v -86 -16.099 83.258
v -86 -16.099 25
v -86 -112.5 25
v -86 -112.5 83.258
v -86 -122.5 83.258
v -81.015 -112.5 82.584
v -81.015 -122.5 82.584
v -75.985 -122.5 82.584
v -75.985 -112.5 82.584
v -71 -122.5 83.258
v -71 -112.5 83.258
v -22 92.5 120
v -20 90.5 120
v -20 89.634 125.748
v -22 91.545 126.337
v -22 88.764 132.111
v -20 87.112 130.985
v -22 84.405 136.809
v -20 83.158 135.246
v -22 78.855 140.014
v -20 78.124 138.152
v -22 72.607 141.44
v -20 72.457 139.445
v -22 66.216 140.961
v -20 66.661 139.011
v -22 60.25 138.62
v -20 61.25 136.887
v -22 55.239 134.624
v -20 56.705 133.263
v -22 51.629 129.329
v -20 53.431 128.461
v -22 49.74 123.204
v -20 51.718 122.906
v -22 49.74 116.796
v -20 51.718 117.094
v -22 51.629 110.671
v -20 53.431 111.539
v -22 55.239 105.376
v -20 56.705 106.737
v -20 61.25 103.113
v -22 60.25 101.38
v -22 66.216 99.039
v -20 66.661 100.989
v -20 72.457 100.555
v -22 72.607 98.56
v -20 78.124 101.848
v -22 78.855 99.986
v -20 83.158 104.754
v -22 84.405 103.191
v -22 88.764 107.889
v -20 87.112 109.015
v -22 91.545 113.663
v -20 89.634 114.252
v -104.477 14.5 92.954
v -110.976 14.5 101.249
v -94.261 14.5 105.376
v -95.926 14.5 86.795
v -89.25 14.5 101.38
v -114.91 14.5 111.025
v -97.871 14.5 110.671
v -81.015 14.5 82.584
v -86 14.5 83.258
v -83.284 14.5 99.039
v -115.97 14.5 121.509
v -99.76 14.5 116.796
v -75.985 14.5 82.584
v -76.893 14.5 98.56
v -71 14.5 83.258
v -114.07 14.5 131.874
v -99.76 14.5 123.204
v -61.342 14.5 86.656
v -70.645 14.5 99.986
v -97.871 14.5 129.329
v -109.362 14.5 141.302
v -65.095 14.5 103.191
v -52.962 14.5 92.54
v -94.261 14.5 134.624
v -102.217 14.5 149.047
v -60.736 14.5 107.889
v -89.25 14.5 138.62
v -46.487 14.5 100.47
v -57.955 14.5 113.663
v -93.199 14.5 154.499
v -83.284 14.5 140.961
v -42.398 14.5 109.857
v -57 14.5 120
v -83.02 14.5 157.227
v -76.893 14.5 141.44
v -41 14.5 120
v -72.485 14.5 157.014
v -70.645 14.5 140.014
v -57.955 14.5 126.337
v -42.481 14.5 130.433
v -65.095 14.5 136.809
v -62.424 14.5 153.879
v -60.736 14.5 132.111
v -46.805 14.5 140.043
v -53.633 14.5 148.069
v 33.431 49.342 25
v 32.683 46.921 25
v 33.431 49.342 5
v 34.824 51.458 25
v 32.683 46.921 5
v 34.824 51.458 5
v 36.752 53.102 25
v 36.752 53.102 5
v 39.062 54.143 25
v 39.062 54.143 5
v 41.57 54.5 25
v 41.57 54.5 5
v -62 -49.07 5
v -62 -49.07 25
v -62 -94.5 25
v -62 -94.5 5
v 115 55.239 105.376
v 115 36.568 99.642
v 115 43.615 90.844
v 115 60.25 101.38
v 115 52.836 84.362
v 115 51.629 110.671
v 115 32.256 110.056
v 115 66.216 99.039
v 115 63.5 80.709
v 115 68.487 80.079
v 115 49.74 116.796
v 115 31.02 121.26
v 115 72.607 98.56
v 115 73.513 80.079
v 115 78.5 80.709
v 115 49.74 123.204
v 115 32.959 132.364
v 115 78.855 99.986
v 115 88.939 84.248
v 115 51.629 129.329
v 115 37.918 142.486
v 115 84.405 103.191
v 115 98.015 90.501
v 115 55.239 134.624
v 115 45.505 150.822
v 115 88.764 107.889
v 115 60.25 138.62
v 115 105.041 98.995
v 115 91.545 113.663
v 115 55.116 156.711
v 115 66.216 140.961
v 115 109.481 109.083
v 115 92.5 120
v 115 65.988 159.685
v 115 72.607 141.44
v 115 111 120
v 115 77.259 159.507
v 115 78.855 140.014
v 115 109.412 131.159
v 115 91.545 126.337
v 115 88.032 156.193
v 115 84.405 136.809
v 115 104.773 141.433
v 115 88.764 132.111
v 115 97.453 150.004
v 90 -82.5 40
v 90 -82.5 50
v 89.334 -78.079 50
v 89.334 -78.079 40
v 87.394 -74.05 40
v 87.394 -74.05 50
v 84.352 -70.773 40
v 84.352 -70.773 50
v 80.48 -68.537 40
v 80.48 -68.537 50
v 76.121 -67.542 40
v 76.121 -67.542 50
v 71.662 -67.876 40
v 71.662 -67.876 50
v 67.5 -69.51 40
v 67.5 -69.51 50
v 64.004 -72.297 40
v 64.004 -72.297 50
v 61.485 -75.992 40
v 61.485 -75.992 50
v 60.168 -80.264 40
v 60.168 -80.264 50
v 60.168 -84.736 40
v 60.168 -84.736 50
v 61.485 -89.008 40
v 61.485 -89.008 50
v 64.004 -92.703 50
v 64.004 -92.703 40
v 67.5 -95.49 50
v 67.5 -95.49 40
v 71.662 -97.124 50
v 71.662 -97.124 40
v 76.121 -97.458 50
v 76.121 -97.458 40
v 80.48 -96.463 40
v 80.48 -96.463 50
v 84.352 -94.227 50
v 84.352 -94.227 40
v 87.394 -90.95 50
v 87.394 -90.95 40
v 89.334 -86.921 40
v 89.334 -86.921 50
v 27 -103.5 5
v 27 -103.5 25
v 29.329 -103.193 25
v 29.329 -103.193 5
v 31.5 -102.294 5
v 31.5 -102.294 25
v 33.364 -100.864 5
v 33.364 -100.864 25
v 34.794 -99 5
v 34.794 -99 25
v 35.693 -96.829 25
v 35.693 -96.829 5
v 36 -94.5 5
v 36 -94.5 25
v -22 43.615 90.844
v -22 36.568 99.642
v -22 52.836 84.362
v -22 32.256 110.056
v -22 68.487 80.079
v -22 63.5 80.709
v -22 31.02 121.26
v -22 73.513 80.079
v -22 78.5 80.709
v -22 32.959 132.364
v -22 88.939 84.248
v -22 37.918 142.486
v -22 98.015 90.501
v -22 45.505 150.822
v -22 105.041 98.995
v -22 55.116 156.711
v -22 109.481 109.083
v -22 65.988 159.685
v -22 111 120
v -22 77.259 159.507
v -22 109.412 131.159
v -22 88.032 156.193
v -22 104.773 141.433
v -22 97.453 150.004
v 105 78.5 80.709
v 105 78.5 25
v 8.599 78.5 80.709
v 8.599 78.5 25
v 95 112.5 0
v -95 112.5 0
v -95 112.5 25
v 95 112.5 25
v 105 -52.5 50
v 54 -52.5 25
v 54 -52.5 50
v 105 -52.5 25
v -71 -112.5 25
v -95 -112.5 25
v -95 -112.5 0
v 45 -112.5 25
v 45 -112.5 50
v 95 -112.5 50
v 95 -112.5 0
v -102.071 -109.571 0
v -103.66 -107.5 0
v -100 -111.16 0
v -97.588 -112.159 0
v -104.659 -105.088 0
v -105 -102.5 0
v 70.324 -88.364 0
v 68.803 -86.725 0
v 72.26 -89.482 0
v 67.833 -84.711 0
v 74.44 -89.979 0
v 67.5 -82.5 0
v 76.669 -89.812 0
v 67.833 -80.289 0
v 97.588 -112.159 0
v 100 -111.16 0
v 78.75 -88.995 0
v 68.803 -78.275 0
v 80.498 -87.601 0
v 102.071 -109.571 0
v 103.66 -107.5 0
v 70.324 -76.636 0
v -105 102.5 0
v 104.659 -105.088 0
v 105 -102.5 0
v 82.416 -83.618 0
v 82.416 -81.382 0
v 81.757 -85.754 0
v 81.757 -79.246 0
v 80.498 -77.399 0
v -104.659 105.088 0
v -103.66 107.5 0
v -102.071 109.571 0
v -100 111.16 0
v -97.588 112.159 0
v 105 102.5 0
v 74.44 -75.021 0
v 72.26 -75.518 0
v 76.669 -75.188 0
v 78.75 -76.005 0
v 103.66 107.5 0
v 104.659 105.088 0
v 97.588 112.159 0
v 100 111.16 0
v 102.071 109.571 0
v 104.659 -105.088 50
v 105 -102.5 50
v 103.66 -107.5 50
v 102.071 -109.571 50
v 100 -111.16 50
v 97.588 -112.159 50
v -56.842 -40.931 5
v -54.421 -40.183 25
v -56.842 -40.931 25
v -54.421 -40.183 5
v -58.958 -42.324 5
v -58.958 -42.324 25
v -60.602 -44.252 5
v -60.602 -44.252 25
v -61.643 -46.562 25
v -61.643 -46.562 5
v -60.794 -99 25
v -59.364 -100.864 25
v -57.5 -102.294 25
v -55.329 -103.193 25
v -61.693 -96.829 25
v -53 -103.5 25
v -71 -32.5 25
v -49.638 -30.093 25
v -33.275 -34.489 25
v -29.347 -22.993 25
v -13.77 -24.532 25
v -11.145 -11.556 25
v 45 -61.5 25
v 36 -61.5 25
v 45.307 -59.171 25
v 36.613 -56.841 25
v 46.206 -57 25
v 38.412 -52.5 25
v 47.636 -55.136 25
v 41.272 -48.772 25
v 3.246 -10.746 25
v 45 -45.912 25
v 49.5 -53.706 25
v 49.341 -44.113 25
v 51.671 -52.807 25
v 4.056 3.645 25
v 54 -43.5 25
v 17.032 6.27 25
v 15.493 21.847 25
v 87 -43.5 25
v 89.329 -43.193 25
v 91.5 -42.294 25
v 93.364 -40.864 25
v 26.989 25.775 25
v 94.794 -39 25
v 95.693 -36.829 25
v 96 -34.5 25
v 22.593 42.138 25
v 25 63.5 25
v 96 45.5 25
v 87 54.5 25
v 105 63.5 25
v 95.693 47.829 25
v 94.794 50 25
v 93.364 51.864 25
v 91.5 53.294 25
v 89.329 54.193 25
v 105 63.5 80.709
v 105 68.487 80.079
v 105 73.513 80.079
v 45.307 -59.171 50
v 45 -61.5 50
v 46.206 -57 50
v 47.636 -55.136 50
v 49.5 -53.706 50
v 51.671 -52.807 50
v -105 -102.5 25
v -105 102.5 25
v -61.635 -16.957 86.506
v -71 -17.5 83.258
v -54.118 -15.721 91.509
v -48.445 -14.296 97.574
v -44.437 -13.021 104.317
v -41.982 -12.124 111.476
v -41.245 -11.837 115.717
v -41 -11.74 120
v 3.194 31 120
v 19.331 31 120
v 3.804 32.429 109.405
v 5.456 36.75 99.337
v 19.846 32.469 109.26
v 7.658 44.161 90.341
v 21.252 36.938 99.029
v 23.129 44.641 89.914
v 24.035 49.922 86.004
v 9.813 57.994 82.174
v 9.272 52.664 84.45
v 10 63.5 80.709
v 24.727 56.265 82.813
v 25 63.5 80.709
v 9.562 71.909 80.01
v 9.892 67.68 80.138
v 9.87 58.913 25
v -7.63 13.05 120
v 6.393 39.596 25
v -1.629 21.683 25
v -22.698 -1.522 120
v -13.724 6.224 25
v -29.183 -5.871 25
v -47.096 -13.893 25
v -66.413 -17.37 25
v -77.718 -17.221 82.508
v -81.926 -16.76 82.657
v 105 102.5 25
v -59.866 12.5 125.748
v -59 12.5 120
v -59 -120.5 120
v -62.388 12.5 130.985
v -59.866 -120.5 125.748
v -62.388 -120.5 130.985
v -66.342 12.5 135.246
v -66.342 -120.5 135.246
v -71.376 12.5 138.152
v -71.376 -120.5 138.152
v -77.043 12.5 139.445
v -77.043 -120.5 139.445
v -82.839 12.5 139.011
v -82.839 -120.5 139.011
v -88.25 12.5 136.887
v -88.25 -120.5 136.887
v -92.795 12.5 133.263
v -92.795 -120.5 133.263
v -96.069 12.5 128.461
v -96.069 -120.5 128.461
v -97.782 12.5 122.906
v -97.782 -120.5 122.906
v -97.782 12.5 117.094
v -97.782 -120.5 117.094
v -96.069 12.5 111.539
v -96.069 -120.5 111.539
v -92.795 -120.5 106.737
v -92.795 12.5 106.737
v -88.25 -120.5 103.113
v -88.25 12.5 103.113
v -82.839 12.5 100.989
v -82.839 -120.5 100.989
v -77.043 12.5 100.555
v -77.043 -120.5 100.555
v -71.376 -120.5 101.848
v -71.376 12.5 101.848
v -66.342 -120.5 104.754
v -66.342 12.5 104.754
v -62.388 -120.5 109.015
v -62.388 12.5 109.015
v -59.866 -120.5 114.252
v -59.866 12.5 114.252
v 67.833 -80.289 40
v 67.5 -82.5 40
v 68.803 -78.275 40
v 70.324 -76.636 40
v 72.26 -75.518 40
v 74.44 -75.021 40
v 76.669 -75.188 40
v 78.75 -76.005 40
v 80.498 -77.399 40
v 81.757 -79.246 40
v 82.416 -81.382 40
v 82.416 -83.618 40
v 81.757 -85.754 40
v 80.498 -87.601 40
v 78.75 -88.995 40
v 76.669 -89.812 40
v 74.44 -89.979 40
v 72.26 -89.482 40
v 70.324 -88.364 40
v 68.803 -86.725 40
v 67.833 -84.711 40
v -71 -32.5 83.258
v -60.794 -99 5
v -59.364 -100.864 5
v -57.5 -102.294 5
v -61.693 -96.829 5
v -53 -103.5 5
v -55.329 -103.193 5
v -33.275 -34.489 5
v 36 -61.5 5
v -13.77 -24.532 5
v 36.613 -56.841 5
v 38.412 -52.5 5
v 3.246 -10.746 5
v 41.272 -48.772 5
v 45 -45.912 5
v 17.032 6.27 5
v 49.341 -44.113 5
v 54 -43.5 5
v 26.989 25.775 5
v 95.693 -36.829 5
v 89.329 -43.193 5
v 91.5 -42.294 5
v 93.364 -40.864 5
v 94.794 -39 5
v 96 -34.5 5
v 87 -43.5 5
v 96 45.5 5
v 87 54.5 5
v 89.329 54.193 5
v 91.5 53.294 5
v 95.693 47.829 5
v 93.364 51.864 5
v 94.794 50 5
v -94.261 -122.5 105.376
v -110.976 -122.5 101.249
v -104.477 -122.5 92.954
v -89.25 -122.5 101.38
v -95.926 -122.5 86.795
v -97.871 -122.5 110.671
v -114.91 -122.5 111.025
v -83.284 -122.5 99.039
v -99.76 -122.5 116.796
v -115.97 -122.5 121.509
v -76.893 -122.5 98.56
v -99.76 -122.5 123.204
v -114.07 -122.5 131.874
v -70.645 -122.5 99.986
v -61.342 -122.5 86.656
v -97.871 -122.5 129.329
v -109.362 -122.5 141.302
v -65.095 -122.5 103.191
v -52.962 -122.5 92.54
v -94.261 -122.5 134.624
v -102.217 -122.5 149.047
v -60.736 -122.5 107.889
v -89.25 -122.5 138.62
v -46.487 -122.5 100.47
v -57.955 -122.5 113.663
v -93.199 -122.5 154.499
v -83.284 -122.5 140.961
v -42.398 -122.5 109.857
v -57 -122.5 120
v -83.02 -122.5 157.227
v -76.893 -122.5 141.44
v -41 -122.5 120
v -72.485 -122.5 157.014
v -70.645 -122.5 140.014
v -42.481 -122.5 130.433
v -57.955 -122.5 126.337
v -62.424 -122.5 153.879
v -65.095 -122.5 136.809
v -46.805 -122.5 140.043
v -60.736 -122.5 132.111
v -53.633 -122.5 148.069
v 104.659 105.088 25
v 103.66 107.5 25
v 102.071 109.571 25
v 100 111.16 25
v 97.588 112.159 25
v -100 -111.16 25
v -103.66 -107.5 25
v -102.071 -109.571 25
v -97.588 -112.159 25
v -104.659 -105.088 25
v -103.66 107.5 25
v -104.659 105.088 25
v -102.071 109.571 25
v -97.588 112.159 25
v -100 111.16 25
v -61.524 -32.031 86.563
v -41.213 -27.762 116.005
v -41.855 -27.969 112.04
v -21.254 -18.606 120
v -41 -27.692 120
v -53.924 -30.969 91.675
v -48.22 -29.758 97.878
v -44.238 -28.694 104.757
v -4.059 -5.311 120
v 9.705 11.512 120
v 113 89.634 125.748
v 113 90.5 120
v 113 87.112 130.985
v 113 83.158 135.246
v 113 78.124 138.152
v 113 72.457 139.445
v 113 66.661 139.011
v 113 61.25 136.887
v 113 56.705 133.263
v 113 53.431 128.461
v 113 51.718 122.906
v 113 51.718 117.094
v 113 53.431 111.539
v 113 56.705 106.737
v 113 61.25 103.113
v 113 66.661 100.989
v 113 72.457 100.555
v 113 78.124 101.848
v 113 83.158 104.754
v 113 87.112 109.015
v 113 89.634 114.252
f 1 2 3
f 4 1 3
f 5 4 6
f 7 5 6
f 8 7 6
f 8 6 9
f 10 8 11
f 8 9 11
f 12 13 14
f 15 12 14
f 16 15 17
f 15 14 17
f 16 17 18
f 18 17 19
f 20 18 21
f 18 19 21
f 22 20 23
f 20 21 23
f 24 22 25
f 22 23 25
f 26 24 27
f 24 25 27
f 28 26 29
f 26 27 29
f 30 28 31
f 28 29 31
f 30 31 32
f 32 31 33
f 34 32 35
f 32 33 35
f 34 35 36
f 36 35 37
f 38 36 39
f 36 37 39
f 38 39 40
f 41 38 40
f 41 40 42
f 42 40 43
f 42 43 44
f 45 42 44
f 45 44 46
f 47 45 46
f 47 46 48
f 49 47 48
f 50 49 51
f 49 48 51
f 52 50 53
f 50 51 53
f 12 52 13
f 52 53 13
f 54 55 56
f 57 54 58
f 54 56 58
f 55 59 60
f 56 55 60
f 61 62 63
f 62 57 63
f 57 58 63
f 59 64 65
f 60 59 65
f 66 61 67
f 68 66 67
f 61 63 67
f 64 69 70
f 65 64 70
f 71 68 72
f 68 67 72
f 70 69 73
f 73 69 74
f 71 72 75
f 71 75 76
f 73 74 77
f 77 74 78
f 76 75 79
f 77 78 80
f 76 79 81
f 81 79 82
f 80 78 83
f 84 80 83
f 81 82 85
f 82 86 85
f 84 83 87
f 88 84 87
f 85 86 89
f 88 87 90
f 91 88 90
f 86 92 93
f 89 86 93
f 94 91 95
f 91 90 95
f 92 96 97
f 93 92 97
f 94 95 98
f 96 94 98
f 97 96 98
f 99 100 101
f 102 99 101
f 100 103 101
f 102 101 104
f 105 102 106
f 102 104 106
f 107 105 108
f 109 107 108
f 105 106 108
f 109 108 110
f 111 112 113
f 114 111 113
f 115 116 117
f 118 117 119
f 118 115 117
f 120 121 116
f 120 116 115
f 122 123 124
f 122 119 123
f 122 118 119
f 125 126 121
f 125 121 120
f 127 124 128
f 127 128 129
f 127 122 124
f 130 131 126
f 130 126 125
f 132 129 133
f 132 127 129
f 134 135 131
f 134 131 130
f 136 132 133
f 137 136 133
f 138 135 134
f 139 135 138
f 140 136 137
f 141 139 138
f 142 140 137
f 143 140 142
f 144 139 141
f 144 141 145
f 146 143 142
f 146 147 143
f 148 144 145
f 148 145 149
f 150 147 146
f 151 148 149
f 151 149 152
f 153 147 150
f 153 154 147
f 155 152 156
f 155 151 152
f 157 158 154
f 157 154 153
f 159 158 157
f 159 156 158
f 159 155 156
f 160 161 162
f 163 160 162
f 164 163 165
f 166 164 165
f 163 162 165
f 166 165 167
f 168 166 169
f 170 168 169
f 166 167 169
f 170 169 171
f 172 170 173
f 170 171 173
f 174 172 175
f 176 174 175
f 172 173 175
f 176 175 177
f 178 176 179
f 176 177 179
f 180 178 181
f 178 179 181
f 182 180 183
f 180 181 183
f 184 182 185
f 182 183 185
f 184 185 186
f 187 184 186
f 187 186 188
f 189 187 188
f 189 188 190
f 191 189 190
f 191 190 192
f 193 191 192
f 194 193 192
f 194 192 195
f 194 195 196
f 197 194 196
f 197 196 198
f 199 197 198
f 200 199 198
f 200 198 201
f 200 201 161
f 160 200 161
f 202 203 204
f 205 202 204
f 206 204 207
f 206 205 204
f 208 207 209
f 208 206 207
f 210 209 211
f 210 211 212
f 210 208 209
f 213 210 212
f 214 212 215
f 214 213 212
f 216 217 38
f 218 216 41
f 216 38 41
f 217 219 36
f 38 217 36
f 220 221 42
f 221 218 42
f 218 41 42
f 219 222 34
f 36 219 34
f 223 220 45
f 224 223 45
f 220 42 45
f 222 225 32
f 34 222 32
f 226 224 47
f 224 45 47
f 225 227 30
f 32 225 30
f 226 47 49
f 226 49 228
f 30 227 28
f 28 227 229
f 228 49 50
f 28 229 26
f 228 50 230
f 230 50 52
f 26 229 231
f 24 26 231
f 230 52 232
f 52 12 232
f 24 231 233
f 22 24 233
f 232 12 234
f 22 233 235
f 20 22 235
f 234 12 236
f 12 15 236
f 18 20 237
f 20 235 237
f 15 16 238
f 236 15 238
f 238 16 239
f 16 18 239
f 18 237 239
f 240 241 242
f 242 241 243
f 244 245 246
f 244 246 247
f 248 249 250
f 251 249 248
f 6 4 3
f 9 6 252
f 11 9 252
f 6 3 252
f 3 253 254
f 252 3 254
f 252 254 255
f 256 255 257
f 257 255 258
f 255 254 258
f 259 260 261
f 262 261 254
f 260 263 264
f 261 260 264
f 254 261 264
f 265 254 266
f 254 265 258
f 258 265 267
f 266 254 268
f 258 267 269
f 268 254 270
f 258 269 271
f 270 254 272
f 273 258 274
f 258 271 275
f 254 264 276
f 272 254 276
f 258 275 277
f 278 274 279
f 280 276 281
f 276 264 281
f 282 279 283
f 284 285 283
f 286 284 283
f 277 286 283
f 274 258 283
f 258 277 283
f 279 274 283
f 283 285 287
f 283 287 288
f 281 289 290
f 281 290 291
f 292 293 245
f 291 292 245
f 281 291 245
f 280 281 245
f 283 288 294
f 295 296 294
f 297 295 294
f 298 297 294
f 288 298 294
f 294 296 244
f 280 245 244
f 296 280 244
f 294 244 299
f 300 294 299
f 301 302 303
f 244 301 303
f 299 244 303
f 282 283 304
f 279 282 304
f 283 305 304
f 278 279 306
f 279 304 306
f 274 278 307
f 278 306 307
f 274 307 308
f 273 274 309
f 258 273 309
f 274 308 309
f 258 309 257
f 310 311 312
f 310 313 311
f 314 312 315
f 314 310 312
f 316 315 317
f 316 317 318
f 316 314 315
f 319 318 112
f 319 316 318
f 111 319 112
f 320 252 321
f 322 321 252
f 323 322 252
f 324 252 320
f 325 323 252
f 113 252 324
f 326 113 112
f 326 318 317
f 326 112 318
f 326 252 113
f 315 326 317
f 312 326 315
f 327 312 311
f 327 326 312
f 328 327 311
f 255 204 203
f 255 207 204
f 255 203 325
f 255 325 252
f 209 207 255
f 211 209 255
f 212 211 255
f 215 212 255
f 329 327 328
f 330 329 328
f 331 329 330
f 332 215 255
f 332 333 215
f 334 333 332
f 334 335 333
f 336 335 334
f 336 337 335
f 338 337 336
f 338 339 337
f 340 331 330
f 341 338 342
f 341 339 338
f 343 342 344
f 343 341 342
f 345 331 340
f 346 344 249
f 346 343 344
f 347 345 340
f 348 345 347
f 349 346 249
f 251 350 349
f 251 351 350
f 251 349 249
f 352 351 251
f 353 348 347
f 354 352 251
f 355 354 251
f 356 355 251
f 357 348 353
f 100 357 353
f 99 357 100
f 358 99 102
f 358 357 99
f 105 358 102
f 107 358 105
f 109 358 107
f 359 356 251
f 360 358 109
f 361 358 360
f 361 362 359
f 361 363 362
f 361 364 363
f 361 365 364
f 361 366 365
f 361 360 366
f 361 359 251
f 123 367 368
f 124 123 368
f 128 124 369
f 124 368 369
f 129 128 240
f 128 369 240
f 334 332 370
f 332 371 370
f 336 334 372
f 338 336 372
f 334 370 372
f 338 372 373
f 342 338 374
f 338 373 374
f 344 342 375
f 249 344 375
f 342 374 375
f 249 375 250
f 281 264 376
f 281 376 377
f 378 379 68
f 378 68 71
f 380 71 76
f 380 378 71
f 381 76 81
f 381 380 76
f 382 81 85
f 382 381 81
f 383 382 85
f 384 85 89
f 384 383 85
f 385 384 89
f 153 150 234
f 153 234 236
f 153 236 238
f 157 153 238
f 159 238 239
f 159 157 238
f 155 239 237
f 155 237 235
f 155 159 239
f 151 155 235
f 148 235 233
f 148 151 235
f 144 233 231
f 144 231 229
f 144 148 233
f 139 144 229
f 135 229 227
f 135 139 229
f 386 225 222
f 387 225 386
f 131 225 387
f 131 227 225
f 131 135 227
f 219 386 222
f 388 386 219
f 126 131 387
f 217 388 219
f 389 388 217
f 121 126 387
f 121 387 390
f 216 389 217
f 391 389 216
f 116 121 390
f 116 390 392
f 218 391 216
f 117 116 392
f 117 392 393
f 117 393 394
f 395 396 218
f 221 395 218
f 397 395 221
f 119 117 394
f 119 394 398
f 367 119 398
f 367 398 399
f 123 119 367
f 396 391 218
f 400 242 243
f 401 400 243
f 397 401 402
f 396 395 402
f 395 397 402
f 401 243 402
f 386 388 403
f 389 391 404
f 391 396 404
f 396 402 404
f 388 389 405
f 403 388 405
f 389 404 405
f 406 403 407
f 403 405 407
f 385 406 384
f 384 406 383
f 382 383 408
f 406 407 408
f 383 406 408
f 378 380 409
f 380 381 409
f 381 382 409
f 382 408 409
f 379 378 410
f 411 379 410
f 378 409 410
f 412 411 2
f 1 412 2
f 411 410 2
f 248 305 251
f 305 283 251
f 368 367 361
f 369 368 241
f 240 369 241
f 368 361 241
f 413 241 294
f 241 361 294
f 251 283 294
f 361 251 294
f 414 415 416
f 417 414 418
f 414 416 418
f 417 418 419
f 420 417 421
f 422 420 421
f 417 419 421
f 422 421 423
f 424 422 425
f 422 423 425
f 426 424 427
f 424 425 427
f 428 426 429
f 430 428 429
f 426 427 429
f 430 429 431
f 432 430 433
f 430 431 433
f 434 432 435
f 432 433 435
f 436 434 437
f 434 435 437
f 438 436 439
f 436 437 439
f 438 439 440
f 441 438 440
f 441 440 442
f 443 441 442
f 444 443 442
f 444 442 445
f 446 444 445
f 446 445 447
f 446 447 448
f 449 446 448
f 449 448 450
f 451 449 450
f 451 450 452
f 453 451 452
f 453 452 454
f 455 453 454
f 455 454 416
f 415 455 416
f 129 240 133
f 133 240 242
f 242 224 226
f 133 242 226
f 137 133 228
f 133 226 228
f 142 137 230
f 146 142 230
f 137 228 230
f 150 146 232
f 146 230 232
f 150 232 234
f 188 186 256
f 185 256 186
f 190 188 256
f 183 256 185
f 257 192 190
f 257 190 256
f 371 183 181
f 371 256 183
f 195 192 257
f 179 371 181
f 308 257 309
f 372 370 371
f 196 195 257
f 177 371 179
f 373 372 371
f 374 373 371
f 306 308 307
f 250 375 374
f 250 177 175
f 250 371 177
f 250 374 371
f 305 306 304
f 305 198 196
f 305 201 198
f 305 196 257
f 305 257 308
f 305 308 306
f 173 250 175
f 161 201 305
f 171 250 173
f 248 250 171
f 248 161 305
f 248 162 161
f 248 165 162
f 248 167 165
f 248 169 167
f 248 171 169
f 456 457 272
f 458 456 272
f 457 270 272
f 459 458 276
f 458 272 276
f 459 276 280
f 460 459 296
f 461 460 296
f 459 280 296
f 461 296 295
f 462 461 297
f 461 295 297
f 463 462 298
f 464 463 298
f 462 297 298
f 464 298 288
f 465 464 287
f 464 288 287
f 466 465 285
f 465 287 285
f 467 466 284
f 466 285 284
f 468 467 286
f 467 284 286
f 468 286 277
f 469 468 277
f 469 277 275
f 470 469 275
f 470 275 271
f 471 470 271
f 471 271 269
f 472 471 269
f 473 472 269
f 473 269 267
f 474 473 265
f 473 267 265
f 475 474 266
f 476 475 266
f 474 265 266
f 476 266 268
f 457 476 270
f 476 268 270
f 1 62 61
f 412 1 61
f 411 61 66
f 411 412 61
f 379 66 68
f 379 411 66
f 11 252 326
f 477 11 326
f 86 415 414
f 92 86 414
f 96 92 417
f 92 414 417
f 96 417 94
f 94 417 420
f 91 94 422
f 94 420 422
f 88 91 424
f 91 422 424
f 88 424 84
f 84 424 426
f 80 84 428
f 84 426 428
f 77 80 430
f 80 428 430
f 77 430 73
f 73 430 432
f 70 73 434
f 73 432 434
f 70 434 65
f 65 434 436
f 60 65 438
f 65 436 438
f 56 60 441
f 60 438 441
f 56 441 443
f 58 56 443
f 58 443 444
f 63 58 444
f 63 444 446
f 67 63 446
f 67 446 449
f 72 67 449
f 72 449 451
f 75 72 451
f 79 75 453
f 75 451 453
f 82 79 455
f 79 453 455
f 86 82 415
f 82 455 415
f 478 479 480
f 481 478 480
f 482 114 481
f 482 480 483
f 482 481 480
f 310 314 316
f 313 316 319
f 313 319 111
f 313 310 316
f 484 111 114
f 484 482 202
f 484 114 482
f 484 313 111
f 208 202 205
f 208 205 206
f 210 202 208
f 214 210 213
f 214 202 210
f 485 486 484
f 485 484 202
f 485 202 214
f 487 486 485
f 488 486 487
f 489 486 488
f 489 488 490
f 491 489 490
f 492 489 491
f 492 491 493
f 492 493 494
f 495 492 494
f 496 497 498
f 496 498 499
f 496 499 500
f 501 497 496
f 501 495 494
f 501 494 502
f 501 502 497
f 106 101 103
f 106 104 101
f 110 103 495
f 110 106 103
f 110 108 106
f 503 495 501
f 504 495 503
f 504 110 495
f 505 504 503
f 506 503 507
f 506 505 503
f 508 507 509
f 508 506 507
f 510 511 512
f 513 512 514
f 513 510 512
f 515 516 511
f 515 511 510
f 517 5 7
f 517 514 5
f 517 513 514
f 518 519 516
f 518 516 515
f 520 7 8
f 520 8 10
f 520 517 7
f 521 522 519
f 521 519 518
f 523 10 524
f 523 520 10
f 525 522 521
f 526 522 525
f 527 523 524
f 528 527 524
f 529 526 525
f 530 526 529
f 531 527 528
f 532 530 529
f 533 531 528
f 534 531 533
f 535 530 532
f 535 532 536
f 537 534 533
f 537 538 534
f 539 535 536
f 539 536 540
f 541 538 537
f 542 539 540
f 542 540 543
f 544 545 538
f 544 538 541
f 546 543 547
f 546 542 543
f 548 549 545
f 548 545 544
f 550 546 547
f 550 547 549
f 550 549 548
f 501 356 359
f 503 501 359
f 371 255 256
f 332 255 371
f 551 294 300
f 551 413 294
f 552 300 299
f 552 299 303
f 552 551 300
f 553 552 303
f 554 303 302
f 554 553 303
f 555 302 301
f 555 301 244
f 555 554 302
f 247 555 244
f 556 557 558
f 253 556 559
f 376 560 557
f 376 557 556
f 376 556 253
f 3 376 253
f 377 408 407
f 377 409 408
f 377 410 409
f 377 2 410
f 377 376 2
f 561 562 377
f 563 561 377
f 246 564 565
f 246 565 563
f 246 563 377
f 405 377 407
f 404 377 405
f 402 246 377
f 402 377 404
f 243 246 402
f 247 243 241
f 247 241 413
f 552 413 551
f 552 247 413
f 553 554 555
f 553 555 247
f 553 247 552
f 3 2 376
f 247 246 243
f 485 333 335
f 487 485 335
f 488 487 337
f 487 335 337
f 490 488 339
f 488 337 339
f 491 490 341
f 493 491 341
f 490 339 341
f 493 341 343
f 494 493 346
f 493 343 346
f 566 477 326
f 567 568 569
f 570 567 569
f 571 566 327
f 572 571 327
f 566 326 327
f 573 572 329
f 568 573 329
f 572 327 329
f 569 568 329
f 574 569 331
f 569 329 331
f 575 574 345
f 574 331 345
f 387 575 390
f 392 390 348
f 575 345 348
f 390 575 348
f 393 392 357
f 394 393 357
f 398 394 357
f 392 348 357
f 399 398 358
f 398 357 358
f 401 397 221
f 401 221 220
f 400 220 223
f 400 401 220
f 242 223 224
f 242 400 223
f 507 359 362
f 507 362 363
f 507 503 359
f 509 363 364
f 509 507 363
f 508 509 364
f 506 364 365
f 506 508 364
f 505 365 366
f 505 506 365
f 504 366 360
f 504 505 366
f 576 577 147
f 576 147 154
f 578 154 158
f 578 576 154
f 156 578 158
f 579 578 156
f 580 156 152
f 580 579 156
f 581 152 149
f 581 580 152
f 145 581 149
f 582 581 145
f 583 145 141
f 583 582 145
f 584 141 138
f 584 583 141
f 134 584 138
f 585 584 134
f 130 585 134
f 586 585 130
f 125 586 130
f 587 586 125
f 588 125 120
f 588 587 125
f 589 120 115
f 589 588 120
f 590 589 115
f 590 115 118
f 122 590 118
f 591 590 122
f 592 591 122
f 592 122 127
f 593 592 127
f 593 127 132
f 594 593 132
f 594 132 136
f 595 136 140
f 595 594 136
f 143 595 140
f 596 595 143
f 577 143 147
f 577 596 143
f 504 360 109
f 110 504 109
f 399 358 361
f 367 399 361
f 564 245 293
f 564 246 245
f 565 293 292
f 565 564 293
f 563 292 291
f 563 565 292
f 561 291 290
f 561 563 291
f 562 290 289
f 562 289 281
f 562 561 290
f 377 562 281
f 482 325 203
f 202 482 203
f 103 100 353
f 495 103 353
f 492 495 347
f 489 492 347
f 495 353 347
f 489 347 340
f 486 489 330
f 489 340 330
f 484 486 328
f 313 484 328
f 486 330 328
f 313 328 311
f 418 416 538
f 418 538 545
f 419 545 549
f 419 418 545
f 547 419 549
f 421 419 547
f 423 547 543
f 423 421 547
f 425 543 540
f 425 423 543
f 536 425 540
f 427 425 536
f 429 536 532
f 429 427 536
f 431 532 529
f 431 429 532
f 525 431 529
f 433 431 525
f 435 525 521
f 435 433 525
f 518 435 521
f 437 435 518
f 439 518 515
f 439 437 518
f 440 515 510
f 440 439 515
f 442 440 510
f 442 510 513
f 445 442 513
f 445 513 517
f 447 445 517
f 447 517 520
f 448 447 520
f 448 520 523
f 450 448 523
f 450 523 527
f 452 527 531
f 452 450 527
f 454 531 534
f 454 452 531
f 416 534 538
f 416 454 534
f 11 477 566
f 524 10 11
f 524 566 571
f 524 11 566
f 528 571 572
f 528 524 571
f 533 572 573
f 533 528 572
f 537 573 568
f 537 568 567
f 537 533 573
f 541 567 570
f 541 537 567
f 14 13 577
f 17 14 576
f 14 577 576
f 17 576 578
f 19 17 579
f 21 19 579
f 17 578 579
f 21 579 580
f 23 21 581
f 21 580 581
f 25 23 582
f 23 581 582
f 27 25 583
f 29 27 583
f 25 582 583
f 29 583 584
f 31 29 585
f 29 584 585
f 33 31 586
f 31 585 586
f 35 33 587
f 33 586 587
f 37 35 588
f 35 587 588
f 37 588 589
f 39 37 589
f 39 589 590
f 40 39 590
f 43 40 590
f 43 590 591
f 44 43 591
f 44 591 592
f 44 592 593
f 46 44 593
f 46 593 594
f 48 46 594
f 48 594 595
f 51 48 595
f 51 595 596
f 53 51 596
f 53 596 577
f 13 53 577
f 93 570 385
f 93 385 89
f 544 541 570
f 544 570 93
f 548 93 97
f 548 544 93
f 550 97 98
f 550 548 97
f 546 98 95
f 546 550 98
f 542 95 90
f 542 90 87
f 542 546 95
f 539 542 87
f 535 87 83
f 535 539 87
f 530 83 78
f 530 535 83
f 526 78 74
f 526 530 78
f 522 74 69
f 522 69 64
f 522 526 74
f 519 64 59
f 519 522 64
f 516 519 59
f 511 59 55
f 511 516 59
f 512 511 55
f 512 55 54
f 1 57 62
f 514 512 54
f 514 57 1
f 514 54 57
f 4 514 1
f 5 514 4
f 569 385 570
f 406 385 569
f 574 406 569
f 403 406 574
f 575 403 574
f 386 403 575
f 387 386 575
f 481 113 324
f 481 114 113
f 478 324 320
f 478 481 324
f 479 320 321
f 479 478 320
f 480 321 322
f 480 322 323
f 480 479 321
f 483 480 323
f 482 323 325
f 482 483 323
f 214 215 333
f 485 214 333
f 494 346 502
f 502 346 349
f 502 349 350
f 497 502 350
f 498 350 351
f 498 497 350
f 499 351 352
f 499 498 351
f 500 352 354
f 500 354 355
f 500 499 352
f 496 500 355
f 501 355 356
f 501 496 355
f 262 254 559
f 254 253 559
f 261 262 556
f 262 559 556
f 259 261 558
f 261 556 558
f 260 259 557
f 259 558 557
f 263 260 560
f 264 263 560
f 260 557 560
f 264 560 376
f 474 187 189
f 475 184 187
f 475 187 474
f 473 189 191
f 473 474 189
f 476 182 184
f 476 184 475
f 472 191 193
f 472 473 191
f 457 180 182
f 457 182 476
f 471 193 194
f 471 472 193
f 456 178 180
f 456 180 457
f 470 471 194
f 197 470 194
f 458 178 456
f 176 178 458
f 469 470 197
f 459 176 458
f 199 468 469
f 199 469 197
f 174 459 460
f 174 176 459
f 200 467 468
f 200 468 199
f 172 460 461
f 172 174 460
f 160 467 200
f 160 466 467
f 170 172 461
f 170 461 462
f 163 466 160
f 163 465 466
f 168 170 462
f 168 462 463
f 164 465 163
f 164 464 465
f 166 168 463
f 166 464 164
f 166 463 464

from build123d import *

# Parameters (mm, degrees)
F0_W            = 210
F0_H            = 225
F1_DEPTH        = 25
F3_DEPTH        = 95
F5_DEPTH        = 10
F5_DEPTH_BACK   = 127
F7_DEPTH        = 10
F7_DEPTH_BACK   = 127
F8_W            = 60
F8_H            = 60
F9_DEPTH        = 25
F10_R           = 9
F12_DEPTH       = 20
F14_D           = 15
F14_CBORE_D     = 30
F14_CBORE_DEPTH = 10
F15_R           = 9
F16_R           = 19.5
F17_DEPTH       = 235.001
F18_R           = 19.5
F19_DEPTH       = 231.0010001
F20_SIZE        = 2
F21_R           = 10


with BuildPart() as f1:
    # F0 (on Top) → F1 (new body)
    with BuildSketch(Plane.XY):
        Rectangle(F0_W, F0_H)
    extrude(amount=F1_DEPTH)

    # F2 (on face) → F3 (join)
    with BuildSketch(Plane.XY.offset(25)):
        with BuildLine():
            Line((-86, -112.5), (-71, -112.5))
            Line((-71, -112.5), (-71, -32.5))
            ThreePointArc((-71, -32.5), (-3.1177490061, -4.3822509939), (25, 63.5))
            Line((25, 63.5), (105, 63.5))
            Line((105, 63.5), (105, 78.5))
            Line((105, 78.5), (8.5989949685, 78.5))
            ThreePointArc((8.5989949685, 78.5), (-13.7243507239, 6.2243507239), (-86, -16.0989949685))
            Line((-86, -16.0989949685), (-86, -112.5))
        make_face()
    extrude(amount=F3_DEPTH)

    # F4 (on face) → F5 (join, two sides)
    with BuildSketch(Plane.XZ.offset(112.5)) as f5_sk:
        with BuildLine():
            Line((-86, 120), (-86, 83.2576538583))
            ThreePointArc((-86, 83.2576538583), (-78.5, 82.5), (-71, 83.2576538583))
            Line((-71, 83.2576538583), (-71, 120))
            Line((-71, 120), (-86, 120))
        make_face()
        with BuildLine():
            ThreePointArc((-71, 83.2576538583), (-49.4526249034, 96.2829175487), (-41, 120))
            ThreePointArc((-41, 120), (-102.2170824513, 149.0473750966), (-86, 83.2576538583))
            Line((-86, 83.2576538583), (-86, 120))
            Line((-86, 120), (-71, 120))
            Line((-71, 120), (-71, 83.2576538583))
        make_face()
    extrude(amount=F5_DEPTH)
    extrude(f5_sk.sketch, amount=-F5_DEPTH_BACK)

    # F6 (on face) → F7 (join, two sides)
    with BuildSketch(Plane.YZ.offset(105)) as f7_sk:
        with BuildLine():
            Line((63.5, 120), (63.5, 80.7094158862))
            ThreePointArc((63.5, 80.7094158862), (71, 80), (78.5, 80.7094158862))
            Line((78.5, 80.7094158862), (78.5, 120))
            Line((78.5, 120), (63.5, 120))
        make_face()
        with BuildLine():
            ThreePointArc((78.5, 80.7094158862), (101.8220700148, 94.504902432), (111, 120))
            ThreePointArc((111, 120), (45.504902432, 150.8220700148), (63.5, 80.7094158862))
            Line((63.5, 80.7094158862), (63.5, 120))
            Line((63.5, 120), (78.5, 120))
            Line((78.5, 120), (78.5, 80.7094158862))
        make_face()
    extrude(amount=F7_DEPTH)
    extrude(f7_sk.sketch, amount=-F7_DEPTH_BACK)

    # F8 (on face) → F9 (join)
    with BuildSketch(Plane.XY.offset(25)):
        with Locations((75, -82.5)):
            Rectangle(F8_W, F8_H)
    extrude(amount=F9_DEPTH)

    # F10
    f10_edges = [f1.edges().sort_by_distance(p)[0] for p in [
        (45, -52.5, 37.5),
    ]]
    fillet(f10_edges, radius=F10_R)

    # F11 (on face) → F12 (cut)
    with BuildSketch(Plane.XY.offset(25)):
        with BuildLine():
            ThreePointArc((33.613574645, 54.5), (3.2462120246, -10.7462120246), (-62, -41.113574645))
            Line((-62, -41.113574645), (-62, -103.5))
            Line((-62, -103.5), (36, -103.5))
            Line((36, -103.5), (36, -61.5))
            ThreePointArc((36, -61.5), (41.2720779386, -48.7720779386), (54, -43.5))
            Line((54, -43.5), (96, -43.5))
            Line((96, -43.5), (96, 54.5))
            Line((96, 54.5), (33.613574645, 54.5))
        make_face()
    extrude(amount=-F12_DEPTH, mode=Mode.SUBTRACT)

    # F14 (through all)
    with Locations(Plane.XY.offset(50)):
        with Locations((75, -82.5)):
            CounterBoreHole(F14_D / 2, F14_CBORE_D / 2, F14_CBORE_DEPTH)

    # F15
    f15_edges = [f1.edges().sort_by_distance(p)[0] for p in [
        (33.613575, 54.5, 15),
        (96, 54.5, 15),
        (-62, -41.113575, 15),
        (-62, -103.5, 15),
        (36, -103.5, 15),
        (96, -43.5, 15),
    ]]
    fillet(f15_edges, radius=F15_R)

    # F16 (on face) → F17 (cut, through all)
    with BuildSketch(Plane.XZ.offset(122.5)):
        with Locations((-78.5, 120)):
            Circle(F16_R)
    extrude(amount=-F17_DEPTH, mode=Mode.SUBTRACT)

    # F18 (on face) → F19 (cut, through all)
    with BuildSketch(Plane.YZ.offset(115)):
        with Locations((71, 120)):
            Circle(F18_R)
    extrude(amount=-F19_DEPTH, mode=Mode.SUBTRACT)

    # F20
    f20_edges = [f1.edges().sort_by_distance(p)[0] for p in [
        (-98, -122.5, 120),
        (115, 51.5, 120),
        (-22, 51.5, 120),
        (-98, 14.5, 120),
    ]]
    chamfer(f20_edges, length=F20_SIZE)

    # F21
    f21_edges = [f1.edges().sort_by_distance(p)[0] for p in [
        (105, -112.5, 25),
        (105, 112.5, 12.5),
        (-105, -112.5, 12.5),
        (-105, 112.5, 12.5),
    ]]
    fillet(f21_edges, radius=F21_R)


solid = f1.part
